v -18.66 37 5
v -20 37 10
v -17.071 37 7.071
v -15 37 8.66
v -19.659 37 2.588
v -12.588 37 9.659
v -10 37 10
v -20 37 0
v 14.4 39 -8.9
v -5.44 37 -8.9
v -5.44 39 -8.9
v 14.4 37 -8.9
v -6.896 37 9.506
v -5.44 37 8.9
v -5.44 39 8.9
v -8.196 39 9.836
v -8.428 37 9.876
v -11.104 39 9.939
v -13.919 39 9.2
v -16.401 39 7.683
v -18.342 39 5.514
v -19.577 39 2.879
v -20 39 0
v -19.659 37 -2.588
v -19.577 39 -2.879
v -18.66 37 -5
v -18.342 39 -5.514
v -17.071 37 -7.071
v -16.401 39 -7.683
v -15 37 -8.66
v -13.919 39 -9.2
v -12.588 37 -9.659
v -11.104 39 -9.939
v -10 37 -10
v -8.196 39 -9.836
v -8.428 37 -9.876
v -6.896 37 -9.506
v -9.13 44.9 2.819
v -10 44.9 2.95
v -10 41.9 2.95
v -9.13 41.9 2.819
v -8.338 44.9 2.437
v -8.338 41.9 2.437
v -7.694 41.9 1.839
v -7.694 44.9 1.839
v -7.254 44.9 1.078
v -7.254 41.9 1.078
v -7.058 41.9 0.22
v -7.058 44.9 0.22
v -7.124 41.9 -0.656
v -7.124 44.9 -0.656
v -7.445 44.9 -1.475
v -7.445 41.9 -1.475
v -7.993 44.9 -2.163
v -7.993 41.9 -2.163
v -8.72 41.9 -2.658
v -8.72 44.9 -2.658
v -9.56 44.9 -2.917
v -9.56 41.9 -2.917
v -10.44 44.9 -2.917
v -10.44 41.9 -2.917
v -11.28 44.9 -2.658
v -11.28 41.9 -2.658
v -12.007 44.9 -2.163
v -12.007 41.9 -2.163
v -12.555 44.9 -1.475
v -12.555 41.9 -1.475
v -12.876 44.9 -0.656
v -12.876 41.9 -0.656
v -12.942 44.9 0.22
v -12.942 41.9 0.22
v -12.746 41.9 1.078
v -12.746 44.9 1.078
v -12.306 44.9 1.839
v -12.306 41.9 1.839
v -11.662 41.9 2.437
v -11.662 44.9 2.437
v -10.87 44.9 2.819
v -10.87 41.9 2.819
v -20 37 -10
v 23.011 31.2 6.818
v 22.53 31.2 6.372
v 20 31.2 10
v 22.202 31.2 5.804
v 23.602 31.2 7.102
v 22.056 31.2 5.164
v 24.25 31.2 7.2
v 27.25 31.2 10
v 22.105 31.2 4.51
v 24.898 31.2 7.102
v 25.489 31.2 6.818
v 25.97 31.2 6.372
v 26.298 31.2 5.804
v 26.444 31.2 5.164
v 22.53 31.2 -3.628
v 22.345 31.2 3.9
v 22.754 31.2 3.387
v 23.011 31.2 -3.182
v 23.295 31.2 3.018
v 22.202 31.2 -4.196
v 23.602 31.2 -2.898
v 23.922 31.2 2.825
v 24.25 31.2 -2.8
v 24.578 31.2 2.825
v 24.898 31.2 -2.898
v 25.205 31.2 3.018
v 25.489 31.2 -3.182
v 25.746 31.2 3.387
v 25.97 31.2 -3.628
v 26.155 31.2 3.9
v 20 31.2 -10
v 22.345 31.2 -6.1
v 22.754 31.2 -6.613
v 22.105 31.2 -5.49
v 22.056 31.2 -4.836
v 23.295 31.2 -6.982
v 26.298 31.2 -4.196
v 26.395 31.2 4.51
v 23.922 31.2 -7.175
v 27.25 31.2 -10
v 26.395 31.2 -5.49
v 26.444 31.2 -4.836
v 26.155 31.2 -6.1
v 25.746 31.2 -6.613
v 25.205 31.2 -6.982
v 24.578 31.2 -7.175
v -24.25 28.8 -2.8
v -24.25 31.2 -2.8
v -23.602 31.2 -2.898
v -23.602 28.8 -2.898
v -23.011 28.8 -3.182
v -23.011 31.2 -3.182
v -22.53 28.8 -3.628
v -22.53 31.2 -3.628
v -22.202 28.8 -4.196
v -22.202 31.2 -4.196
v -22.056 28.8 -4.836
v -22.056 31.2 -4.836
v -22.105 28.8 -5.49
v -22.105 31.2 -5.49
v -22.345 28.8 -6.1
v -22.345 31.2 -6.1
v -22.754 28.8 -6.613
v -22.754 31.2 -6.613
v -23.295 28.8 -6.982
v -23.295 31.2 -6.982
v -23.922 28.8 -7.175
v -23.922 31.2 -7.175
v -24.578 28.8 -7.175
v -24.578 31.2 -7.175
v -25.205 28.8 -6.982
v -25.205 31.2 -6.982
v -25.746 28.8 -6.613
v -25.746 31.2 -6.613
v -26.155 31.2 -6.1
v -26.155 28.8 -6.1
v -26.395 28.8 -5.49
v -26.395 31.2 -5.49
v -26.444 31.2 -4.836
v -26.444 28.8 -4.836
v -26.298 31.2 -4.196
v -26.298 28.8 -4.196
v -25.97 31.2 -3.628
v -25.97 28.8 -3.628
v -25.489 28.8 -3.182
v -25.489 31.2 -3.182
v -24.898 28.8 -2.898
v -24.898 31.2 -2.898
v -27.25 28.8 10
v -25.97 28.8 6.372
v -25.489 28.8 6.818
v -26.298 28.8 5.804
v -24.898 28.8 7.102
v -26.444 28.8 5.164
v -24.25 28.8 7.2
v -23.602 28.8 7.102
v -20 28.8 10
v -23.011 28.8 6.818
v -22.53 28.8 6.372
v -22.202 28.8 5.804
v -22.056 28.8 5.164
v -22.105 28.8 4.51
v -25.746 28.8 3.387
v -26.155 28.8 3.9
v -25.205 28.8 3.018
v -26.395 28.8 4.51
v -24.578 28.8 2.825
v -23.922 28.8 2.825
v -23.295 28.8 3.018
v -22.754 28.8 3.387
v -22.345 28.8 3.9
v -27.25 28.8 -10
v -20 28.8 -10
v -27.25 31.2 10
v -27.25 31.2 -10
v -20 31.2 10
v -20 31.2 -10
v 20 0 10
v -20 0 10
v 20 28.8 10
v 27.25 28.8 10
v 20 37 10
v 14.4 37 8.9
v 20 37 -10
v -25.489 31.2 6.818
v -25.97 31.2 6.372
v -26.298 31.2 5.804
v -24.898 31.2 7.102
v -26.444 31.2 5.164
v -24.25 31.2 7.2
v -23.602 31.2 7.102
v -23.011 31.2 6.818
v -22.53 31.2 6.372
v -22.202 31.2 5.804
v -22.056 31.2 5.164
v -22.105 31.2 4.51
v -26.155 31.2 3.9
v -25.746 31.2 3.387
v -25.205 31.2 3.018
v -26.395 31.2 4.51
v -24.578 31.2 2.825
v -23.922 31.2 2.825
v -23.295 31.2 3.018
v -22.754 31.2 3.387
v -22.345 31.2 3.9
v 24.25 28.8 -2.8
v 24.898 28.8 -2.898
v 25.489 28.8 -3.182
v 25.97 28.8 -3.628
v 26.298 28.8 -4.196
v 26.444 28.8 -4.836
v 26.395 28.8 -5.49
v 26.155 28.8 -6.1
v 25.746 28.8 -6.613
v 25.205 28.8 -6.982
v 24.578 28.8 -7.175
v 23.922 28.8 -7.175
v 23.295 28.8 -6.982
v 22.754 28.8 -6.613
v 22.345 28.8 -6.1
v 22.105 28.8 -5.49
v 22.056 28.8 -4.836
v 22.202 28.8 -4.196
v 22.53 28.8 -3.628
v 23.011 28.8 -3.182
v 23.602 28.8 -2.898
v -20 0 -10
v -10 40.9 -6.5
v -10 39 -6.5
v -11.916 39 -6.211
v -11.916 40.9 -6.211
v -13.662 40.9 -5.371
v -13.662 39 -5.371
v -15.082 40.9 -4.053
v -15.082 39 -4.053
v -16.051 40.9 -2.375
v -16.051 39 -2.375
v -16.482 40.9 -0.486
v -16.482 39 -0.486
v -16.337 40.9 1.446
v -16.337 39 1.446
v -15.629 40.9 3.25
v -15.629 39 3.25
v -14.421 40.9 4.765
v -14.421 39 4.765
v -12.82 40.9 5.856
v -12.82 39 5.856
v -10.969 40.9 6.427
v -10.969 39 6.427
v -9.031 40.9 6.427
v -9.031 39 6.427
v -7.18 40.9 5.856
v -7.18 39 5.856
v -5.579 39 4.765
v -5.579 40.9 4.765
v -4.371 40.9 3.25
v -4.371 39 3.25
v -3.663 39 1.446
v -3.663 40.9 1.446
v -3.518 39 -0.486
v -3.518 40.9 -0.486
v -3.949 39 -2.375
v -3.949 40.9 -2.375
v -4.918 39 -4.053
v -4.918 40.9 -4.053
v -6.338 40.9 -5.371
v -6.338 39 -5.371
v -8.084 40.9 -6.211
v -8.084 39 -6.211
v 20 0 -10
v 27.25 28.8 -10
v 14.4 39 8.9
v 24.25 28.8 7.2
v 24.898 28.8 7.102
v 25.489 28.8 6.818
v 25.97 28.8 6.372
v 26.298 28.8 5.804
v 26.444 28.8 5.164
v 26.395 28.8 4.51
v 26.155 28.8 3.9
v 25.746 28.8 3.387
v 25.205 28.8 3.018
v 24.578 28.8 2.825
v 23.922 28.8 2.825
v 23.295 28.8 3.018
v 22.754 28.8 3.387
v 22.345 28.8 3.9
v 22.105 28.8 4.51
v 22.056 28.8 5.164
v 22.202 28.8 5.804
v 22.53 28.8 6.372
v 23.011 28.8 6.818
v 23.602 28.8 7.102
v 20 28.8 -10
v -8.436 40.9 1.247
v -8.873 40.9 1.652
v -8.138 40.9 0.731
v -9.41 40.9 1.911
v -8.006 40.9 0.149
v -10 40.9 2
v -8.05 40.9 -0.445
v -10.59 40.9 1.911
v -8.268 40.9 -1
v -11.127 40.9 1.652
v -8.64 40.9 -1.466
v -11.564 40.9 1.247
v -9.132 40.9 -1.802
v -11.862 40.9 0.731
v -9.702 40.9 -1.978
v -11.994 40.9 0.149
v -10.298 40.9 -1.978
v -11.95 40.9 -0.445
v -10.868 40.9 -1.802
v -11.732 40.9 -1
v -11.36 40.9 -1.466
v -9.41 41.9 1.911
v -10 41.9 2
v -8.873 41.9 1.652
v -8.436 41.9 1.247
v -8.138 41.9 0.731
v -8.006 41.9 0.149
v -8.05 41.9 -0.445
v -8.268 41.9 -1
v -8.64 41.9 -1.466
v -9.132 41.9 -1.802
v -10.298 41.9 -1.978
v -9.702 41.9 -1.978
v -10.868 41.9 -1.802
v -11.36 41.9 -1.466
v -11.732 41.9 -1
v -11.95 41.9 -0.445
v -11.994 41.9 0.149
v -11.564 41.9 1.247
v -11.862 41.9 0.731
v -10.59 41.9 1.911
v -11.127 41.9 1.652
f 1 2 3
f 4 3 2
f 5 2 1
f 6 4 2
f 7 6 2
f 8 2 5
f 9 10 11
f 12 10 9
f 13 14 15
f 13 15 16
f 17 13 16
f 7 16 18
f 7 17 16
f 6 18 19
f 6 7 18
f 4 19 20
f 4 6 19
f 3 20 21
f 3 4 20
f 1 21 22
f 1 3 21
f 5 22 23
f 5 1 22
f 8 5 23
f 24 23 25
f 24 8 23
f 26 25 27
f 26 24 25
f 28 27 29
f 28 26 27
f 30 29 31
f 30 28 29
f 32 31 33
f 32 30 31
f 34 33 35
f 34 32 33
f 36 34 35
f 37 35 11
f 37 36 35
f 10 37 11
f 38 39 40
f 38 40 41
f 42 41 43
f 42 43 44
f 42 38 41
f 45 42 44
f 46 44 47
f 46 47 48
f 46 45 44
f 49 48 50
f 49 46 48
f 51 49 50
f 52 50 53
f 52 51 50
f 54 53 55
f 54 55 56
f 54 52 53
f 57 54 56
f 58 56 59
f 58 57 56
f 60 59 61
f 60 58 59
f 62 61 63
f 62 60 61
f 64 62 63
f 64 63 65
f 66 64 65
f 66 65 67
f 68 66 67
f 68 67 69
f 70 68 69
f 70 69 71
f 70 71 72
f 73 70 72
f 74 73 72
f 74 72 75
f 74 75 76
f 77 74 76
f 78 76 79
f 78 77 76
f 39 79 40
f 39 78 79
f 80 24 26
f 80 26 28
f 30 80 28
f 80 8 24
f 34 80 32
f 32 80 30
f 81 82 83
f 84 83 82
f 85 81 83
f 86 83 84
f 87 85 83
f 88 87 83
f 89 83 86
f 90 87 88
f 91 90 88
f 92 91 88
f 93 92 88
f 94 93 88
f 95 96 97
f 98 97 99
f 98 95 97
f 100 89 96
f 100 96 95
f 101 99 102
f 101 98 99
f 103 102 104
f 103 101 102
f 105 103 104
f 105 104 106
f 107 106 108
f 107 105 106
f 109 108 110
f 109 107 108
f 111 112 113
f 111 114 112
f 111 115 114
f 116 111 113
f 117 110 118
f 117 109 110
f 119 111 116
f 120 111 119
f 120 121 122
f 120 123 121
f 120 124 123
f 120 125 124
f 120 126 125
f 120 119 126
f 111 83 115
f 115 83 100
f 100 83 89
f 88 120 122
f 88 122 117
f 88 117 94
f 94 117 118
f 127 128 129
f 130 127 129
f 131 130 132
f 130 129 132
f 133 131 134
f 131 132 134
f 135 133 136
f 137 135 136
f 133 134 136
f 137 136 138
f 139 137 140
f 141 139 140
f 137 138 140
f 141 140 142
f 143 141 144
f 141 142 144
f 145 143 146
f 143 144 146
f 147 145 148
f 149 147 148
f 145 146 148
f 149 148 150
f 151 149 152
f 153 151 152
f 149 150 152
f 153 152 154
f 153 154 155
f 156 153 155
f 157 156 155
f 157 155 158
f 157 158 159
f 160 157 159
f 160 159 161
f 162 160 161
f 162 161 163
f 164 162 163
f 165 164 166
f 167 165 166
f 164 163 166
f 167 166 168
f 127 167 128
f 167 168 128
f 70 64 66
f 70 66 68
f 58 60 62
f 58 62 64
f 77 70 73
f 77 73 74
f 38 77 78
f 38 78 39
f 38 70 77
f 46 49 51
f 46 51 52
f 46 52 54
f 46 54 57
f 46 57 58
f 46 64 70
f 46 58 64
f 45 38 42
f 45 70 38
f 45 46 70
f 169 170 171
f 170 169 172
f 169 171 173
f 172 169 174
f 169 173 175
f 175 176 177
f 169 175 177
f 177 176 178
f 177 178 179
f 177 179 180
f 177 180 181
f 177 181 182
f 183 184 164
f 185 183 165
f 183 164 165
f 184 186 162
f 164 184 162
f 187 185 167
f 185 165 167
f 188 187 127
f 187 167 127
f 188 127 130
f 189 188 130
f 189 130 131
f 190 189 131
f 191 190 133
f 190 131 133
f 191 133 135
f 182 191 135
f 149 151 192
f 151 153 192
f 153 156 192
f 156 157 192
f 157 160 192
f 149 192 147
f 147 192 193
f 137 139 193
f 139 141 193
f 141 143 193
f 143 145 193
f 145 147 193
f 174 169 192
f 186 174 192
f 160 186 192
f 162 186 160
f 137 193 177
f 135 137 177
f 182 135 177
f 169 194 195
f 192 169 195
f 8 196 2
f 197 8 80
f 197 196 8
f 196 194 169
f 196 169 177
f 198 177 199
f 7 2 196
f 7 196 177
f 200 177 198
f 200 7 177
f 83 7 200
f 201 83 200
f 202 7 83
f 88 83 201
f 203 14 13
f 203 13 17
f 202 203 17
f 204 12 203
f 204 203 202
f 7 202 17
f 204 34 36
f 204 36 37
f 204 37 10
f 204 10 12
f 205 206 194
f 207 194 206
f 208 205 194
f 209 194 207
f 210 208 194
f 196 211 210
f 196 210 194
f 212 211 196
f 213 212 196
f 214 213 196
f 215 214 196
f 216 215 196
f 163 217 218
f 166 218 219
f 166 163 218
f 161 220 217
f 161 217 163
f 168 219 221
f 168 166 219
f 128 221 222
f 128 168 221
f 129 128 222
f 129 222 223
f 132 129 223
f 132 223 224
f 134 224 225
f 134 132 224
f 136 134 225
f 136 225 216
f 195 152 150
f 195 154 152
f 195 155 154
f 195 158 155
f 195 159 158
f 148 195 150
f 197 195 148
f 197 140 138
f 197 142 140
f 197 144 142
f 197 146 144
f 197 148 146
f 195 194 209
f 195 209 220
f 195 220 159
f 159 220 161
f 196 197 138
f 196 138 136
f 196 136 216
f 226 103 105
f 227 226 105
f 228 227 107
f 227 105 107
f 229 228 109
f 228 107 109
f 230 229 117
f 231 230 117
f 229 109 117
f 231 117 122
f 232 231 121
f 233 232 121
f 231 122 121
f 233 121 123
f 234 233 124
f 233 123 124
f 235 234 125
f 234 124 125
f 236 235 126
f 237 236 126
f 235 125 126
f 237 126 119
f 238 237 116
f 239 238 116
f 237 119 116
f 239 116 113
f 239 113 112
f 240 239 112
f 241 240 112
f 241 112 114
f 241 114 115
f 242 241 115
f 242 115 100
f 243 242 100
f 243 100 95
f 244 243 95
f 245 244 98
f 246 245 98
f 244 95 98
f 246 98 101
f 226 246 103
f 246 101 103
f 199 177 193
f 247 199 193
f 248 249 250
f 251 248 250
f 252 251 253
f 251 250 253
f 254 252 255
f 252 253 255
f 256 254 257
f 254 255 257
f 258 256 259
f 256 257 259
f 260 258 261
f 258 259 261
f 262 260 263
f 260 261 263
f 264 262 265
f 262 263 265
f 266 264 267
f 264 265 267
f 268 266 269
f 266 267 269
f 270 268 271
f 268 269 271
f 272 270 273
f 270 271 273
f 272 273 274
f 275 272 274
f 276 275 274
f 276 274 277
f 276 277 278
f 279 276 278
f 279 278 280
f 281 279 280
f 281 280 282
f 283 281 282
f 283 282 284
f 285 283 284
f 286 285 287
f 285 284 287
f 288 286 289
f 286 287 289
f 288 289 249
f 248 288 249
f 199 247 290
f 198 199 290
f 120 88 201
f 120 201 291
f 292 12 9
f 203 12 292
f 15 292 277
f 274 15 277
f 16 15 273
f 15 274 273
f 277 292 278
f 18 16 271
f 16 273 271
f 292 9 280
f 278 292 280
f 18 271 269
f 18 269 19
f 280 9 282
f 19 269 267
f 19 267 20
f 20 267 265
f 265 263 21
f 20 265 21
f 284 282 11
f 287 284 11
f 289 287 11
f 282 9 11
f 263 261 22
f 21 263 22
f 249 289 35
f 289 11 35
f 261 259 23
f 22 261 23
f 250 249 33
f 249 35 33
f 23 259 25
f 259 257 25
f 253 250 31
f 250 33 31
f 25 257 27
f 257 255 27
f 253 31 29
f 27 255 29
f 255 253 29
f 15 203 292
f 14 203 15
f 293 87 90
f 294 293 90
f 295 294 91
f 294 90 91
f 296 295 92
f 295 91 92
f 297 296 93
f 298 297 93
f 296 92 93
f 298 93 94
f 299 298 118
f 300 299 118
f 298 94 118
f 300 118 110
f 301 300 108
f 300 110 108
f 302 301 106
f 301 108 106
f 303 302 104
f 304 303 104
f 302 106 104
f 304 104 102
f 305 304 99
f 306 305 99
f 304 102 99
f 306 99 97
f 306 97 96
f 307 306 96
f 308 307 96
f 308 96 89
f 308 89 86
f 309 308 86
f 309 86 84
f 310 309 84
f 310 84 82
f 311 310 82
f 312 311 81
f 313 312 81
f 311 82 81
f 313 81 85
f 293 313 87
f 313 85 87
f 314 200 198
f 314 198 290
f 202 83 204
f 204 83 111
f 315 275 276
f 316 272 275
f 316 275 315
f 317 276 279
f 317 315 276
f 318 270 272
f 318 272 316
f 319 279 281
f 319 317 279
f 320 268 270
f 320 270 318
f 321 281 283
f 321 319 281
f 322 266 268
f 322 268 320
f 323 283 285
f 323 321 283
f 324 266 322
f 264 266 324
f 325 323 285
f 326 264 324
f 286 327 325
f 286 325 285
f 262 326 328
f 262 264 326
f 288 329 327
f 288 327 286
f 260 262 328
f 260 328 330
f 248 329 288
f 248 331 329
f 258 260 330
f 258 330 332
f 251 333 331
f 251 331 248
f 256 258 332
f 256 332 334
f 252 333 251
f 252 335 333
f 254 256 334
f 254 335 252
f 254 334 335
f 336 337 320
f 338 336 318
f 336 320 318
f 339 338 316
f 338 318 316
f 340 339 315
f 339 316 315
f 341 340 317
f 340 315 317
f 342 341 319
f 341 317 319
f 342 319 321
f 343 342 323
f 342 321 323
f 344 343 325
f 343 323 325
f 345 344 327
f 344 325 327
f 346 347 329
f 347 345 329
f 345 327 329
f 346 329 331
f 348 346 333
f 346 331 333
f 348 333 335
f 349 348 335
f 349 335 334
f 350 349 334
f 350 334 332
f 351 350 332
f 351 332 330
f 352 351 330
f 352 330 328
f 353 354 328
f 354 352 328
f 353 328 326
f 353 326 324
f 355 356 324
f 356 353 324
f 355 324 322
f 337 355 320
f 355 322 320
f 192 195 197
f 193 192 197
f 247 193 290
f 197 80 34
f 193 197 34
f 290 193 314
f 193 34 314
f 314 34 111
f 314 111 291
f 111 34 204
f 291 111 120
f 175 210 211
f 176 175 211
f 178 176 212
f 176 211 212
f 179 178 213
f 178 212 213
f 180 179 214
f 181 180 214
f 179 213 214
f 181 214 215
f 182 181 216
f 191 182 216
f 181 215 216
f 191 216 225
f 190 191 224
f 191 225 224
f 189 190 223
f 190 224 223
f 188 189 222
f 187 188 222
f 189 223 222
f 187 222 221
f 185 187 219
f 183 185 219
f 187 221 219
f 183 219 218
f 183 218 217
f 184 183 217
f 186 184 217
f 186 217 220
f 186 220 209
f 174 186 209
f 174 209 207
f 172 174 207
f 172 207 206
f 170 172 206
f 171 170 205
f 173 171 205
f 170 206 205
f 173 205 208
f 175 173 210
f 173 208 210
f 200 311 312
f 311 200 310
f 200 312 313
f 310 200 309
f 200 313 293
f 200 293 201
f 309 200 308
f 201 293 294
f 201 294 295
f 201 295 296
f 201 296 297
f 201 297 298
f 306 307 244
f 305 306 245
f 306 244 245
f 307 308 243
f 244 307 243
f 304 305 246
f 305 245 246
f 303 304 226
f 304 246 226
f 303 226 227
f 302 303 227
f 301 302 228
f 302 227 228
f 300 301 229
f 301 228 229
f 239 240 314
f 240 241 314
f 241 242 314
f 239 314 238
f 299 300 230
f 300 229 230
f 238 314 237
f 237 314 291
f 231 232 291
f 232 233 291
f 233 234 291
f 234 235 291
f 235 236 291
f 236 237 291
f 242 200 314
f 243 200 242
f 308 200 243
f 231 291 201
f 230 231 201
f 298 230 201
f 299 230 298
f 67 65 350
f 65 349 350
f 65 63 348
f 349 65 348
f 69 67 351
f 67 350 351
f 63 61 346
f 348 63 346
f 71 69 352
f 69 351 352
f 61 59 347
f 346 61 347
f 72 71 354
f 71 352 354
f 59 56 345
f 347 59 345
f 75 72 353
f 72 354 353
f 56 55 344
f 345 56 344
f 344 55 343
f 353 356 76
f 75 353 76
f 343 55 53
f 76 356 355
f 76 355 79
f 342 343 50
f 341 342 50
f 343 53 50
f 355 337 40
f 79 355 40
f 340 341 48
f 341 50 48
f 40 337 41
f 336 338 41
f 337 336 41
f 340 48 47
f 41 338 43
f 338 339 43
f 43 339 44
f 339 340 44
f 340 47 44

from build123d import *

# Parameters (mm, degrees)
SKETCH_1_W      = 40
SKETCH_1_H      = 20
EXTRUDE_1_DEPTH = 37
EXTRUDE_START   = -5.8
SKETCH_2_W      = 54.5
SKETCH_2_H      = 20
SKETCH_2_R      = 2.2
EXTRUDE_2_DEPTH = 2.4
EXTRUDE_3_DEPTH = 2
SKETCH_4_R      = 6.5
EXTRUDE_4_DEPTH = 1.9
SKETCH_5_R      = 2
EXTRUDE_5_DEPTH = 4
SKETCH_6_R      = 2.95
EXTRUDE_6_DEPTH = 3


with BuildPart() as part:
    # 草图1 → 凸台-拉伸1 (new body)
    with BuildSketch(Plane(origin=(0, 0, 0), x_dir=(1, 0, 0), z_dir=(0, 1, 0))):
        Rectangle(SKETCH_1_W, SKETCH_1_H)
    extrude(amount=EXTRUDE_1_DEPTH)

    # 草图2 → 凸台-拉伸2 (add)
    with BuildSketch(Plane(origin=(0, 37, 0), x_dir=(1, 0, 0), z_dir=(0, 1, 0)).offset(EXTRUDE_START)):
        Rectangle(SKETCH_2_W, SKETCH_2_H)
        with Locations(Location((24.25, 5, 0), (0, 0, 270))):
            Circle(SKETCH_2_R, mode=Mode.SUBTRACT)
        with Locations(Location((24.25, -5, 0), (0, 0, 270))):
            Circle(SKETCH_2_R, mode=Mode.SUBTRACT)
        with Locations(Location((-24.25, 5, 0), (0, 0, 270))):
            Circle(SKETCH_2_R, mode=Mode.SUBTRACT)
        with Locations(Location((-24.25, -5, 0), (0, 0, 270))):
            Circle(SKETCH_2_R, mode=Mode.SUBTRACT)
    extrude(amount=-EXTRUDE_2_DEPTH)

    # 草图3 → 凸台-拉伸3 (add)
    with BuildSketch(Plane(origin=(0, 37, 0), x_dir=(1, 0, 0), z_dir=(0, 1, 0))):
        with BuildLine():
            Line((-5.440394754, 8.9), (14.4, 8.9))
            Line((14.4, 8.9), (14.4, -8.9))
            Line((14.4, -8.9), (-5.440394754, -8.9))
            ThreePointArc((-5.440394754, -8.9), (-20, 0), (-5.440394754, 8.9))
        make_face()
    extrude(amount=EXTRUDE_3_DEPTH)

    # 草图4 → 凸台-拉伸4 (add)
    with BuildSketch(Plane(origin=(0, 39, 0), x_dir=(1, 0, 0), z_dir=(0, 1, 0))):
        with Locations(Location((-10, 0, 0), (0, 0, 90))):
            Circle(SKETCH_4_R)
    extrude(amount=EXTRUDE_4_DEPTH)

    # 草图5 → 凸台-拉伸5 (add)
    with BuildSketch(Plane(origin=(0, 40.9, 0), x_dir=(1, 0, 0), z_dir=(0, 1, 0))):
        with Locations(Location((-10, 0, 0), (0, 0, 270))):
            Circle(SKETCH_5_R)
    extrude(amount=EXTRUDE_5_DEPTH)

    # 草图6 → 凸台-拉伸6 (add)
    with BuildSketch(Plane(origin=(0, 44.9, 0), x_dir=(1, 0, 0), z_dir=(0, 1, 0))):
        with Locations(Location((-10, 0, 0), (0, 0, 270))):
            Circle(SKETCH_6_R)
    extrude(amount=-EXTRUDE_6_DEPTH)


solid = part.part
